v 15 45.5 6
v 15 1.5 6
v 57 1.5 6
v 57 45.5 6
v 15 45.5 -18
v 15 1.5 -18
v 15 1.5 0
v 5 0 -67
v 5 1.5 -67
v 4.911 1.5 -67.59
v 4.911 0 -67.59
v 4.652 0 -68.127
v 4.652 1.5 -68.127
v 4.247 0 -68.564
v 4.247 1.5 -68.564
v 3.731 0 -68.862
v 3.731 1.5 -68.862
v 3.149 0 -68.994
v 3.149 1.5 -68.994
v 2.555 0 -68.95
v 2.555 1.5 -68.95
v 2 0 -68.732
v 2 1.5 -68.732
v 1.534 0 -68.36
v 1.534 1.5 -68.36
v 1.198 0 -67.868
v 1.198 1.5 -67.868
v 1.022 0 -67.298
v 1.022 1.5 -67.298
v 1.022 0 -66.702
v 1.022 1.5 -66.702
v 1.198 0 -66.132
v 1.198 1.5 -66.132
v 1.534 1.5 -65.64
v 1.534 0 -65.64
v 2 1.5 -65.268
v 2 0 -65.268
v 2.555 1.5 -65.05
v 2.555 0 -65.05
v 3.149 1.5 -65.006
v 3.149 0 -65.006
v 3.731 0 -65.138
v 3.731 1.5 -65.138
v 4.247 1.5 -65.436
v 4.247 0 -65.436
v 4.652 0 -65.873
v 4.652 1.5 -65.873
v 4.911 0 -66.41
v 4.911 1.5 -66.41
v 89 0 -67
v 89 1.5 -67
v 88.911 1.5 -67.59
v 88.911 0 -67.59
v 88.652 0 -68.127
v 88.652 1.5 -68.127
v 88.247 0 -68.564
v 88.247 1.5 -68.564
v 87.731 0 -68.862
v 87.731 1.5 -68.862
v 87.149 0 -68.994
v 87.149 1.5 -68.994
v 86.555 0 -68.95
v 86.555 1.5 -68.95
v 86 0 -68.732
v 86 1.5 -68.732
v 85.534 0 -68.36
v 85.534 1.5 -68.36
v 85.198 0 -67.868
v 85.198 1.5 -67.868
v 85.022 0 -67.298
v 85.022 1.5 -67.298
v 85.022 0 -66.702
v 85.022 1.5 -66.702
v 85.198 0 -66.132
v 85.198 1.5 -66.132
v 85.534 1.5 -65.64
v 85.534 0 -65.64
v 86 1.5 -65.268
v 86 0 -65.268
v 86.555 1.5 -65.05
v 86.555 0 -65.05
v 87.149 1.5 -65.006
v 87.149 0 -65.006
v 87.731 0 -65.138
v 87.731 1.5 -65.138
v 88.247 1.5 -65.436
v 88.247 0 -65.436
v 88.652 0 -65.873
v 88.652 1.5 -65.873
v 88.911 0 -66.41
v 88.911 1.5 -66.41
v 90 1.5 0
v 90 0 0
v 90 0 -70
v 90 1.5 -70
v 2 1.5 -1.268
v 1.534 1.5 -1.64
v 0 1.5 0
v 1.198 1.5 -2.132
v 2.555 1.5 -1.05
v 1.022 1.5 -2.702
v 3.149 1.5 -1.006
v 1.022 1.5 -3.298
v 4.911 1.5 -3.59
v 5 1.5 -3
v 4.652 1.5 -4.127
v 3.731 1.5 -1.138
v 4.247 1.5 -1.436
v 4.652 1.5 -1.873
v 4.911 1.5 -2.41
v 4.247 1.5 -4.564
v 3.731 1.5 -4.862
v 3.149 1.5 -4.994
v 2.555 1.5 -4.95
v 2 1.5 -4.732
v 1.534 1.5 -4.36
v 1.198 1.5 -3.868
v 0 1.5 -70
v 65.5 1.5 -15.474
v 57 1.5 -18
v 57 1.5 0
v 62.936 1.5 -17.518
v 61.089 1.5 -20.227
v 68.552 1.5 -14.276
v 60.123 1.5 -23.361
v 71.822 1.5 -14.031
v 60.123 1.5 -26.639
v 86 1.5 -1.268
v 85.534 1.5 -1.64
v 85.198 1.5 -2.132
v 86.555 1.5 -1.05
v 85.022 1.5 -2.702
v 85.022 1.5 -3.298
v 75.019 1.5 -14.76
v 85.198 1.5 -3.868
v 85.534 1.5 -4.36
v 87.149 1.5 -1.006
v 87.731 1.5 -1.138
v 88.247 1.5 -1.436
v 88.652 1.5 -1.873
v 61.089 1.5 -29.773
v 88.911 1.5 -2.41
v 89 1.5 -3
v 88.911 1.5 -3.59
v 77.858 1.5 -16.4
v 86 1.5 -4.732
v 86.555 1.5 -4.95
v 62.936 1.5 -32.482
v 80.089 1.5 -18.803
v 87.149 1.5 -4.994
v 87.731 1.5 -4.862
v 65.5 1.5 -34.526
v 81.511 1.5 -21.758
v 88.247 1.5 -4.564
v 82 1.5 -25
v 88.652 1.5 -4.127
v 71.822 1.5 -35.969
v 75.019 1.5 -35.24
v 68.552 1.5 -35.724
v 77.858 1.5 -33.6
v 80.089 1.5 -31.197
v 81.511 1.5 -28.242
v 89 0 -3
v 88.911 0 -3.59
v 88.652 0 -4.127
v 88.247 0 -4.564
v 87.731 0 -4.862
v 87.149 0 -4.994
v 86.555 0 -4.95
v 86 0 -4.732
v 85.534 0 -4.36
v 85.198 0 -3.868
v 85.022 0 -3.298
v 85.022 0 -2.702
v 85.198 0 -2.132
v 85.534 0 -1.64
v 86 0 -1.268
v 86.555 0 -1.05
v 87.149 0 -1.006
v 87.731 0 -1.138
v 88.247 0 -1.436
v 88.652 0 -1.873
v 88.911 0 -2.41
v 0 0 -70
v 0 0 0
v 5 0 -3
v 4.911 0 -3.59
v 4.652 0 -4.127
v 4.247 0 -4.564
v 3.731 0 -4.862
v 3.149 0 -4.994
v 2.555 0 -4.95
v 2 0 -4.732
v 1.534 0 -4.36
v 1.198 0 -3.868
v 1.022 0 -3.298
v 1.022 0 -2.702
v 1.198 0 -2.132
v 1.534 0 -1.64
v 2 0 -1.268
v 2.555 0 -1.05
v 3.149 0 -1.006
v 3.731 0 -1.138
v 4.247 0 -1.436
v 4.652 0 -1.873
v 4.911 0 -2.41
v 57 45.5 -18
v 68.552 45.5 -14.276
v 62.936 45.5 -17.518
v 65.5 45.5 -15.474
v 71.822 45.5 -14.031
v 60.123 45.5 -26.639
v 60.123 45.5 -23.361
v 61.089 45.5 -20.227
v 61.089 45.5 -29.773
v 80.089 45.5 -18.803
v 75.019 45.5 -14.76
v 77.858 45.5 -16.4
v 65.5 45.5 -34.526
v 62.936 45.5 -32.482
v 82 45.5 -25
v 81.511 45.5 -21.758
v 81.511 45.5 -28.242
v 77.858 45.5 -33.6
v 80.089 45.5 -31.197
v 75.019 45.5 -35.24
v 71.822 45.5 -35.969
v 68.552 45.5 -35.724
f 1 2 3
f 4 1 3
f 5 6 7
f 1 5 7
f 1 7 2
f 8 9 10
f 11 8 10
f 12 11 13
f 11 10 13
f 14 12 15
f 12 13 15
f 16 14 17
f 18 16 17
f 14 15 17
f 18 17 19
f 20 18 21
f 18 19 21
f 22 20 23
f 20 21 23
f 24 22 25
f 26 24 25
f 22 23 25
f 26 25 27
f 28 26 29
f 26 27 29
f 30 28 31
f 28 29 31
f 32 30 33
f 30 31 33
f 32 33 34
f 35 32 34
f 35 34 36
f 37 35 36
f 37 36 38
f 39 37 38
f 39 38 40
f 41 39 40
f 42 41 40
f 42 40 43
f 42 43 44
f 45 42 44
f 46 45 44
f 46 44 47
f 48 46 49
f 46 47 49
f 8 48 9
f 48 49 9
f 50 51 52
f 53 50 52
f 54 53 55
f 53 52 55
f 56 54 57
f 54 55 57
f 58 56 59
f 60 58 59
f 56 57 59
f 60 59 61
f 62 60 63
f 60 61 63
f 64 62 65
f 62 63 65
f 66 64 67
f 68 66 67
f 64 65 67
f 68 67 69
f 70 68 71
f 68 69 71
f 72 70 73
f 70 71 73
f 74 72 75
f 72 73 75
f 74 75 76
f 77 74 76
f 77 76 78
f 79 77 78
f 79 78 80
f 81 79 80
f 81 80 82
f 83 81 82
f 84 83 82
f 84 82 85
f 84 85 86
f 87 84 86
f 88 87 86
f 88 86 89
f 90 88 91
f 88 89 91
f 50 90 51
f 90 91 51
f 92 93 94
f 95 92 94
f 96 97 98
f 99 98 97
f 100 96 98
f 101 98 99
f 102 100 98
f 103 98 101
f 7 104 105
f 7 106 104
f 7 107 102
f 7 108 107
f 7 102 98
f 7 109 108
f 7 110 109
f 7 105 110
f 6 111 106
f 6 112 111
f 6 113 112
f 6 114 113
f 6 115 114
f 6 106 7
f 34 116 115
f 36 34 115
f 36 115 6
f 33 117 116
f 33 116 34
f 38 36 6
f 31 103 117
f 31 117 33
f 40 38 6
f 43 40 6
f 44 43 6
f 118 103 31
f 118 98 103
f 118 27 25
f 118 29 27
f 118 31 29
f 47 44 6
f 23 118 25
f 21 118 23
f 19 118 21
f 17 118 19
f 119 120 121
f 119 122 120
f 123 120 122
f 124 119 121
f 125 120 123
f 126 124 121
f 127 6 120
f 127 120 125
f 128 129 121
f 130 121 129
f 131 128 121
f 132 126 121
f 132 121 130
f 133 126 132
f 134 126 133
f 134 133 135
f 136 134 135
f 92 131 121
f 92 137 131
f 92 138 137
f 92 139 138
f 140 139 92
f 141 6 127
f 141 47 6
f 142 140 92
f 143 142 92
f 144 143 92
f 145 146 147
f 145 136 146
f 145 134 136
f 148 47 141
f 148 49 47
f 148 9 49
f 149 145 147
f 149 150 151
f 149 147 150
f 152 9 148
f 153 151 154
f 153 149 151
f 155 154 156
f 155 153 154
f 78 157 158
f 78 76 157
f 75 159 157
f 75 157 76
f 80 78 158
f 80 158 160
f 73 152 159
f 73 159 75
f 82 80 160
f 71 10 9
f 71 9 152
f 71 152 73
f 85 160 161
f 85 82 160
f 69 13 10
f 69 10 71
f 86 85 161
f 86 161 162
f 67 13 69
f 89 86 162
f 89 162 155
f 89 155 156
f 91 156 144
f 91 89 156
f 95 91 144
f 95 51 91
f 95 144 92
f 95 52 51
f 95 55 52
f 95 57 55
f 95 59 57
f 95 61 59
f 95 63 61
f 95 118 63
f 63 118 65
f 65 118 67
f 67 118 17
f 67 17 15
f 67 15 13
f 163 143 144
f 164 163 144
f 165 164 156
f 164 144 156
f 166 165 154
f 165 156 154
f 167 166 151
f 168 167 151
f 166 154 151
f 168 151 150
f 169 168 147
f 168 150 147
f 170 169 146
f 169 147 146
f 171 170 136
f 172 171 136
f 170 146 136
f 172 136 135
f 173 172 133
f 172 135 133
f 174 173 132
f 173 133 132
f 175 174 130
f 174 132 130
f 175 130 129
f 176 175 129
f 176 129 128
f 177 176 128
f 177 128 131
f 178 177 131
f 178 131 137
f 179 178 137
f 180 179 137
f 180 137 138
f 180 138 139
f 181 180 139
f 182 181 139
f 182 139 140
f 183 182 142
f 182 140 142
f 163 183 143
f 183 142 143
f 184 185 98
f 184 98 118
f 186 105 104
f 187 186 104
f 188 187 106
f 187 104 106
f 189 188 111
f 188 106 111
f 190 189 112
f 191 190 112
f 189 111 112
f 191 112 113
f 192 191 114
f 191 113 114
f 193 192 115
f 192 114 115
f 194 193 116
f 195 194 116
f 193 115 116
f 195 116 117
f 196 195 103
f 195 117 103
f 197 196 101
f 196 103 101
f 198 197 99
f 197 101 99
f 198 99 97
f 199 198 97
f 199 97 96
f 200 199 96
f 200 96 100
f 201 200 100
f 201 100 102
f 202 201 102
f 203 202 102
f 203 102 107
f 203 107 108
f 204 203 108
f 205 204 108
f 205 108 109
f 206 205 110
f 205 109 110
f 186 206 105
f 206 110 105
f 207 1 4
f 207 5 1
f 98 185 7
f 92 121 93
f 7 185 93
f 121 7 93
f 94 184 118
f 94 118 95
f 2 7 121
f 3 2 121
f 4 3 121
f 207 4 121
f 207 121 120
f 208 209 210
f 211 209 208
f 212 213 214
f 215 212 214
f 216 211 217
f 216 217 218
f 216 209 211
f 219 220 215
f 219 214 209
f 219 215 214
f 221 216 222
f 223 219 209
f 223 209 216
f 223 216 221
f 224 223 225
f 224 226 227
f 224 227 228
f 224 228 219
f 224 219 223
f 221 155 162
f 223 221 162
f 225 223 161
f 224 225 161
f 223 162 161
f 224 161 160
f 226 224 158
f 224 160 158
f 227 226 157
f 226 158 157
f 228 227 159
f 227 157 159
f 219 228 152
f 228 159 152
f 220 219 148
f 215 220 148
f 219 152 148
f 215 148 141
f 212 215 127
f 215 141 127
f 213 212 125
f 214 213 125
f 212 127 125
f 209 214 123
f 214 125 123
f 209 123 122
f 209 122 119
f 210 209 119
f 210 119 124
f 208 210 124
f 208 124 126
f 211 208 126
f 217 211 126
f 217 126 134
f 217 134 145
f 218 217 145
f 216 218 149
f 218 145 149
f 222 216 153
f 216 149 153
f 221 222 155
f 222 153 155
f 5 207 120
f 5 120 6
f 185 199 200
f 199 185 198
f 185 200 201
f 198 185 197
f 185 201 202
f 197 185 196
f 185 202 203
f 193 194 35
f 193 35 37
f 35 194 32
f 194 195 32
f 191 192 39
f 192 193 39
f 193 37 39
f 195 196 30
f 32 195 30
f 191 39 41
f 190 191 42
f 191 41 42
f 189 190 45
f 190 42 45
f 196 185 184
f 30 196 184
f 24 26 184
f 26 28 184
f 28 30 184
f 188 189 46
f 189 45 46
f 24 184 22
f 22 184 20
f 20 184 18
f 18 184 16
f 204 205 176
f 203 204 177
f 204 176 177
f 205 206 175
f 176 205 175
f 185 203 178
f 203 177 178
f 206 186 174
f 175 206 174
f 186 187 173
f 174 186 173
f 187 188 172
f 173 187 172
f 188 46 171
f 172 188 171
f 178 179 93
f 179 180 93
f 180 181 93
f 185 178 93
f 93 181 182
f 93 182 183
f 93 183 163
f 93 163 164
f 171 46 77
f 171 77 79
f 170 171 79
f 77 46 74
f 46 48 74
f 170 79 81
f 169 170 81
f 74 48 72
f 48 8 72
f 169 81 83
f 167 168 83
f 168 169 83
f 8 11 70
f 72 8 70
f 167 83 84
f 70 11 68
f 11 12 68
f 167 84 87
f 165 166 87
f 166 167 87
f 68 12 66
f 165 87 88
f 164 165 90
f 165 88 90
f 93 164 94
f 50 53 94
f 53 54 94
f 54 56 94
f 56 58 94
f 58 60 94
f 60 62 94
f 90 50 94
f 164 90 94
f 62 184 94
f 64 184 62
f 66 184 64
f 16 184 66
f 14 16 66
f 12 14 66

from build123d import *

# Parameters (mm, degrees)
ESBO_O1_W                = 90
ESBO_O1_H                = 70
RESSALTO_EXTRUS_O1_DEPTH = 1.5
ESBO_O2_R                = 2
CORTE_EXTRUS_O1_DEPTH    = 1.5
ESBO_O3_R                = 11
RESSALTO_EXTRUS_O2_DEPTH = 44


with BuildPart() as part:
    # Esboço1 → Ressalto-extrusão1 (new body)
    with BuildSketch(Plane(origin=(0, 0, 0), x_dir=(1, 0, 0), z_dir=(0, 1, 0))):
        with Locations((45, 35)):
            Rectangle(ESBO_O1_W, ESBO_O1_H)
    extrude(amount=RESSALTO_EXTRUS_O1_DEPTH)

    # Esboço2 → Corte-extrusão1 (cut)
    with BuildSketch(Plane(origin=(0, 1.5, 0), x_dir=(1, 0, 0), z_dir=(0, 1, 0))):
        with Locations((87, 3)):
            Circle(ESBO_O2_R)
        with Locations((87, 67)):
            Circle(ESBO_O2_R)
        with Locations((3, 3)):
            Circle(ESBO_O2_R)
        with Locations((3, 67)):
            Circle(ESBO_O2_R)
    extrude(amount=-CORTE_EXTRUS_O1_DEPTH, mode=Mode.SUBTRACT)

    # Esboço3 → Ressalto-extrusão2 (add)
    with BuildSketch(Plane(origin=(0, 1.5, 0), x_dir=(1, 0, 0), z_dir=(0, 1, 0))):
        with Locations((71, 25)):
            Circle(ESBO_O3_R)
        Polygon((15, 0), (15, -6), (57, -6), (57, 0), (57, 18), (15, 18), align=None)
    extrude(amount=RESSALTO_EXTRUS_O2_DEPTH)


solid = part.part
